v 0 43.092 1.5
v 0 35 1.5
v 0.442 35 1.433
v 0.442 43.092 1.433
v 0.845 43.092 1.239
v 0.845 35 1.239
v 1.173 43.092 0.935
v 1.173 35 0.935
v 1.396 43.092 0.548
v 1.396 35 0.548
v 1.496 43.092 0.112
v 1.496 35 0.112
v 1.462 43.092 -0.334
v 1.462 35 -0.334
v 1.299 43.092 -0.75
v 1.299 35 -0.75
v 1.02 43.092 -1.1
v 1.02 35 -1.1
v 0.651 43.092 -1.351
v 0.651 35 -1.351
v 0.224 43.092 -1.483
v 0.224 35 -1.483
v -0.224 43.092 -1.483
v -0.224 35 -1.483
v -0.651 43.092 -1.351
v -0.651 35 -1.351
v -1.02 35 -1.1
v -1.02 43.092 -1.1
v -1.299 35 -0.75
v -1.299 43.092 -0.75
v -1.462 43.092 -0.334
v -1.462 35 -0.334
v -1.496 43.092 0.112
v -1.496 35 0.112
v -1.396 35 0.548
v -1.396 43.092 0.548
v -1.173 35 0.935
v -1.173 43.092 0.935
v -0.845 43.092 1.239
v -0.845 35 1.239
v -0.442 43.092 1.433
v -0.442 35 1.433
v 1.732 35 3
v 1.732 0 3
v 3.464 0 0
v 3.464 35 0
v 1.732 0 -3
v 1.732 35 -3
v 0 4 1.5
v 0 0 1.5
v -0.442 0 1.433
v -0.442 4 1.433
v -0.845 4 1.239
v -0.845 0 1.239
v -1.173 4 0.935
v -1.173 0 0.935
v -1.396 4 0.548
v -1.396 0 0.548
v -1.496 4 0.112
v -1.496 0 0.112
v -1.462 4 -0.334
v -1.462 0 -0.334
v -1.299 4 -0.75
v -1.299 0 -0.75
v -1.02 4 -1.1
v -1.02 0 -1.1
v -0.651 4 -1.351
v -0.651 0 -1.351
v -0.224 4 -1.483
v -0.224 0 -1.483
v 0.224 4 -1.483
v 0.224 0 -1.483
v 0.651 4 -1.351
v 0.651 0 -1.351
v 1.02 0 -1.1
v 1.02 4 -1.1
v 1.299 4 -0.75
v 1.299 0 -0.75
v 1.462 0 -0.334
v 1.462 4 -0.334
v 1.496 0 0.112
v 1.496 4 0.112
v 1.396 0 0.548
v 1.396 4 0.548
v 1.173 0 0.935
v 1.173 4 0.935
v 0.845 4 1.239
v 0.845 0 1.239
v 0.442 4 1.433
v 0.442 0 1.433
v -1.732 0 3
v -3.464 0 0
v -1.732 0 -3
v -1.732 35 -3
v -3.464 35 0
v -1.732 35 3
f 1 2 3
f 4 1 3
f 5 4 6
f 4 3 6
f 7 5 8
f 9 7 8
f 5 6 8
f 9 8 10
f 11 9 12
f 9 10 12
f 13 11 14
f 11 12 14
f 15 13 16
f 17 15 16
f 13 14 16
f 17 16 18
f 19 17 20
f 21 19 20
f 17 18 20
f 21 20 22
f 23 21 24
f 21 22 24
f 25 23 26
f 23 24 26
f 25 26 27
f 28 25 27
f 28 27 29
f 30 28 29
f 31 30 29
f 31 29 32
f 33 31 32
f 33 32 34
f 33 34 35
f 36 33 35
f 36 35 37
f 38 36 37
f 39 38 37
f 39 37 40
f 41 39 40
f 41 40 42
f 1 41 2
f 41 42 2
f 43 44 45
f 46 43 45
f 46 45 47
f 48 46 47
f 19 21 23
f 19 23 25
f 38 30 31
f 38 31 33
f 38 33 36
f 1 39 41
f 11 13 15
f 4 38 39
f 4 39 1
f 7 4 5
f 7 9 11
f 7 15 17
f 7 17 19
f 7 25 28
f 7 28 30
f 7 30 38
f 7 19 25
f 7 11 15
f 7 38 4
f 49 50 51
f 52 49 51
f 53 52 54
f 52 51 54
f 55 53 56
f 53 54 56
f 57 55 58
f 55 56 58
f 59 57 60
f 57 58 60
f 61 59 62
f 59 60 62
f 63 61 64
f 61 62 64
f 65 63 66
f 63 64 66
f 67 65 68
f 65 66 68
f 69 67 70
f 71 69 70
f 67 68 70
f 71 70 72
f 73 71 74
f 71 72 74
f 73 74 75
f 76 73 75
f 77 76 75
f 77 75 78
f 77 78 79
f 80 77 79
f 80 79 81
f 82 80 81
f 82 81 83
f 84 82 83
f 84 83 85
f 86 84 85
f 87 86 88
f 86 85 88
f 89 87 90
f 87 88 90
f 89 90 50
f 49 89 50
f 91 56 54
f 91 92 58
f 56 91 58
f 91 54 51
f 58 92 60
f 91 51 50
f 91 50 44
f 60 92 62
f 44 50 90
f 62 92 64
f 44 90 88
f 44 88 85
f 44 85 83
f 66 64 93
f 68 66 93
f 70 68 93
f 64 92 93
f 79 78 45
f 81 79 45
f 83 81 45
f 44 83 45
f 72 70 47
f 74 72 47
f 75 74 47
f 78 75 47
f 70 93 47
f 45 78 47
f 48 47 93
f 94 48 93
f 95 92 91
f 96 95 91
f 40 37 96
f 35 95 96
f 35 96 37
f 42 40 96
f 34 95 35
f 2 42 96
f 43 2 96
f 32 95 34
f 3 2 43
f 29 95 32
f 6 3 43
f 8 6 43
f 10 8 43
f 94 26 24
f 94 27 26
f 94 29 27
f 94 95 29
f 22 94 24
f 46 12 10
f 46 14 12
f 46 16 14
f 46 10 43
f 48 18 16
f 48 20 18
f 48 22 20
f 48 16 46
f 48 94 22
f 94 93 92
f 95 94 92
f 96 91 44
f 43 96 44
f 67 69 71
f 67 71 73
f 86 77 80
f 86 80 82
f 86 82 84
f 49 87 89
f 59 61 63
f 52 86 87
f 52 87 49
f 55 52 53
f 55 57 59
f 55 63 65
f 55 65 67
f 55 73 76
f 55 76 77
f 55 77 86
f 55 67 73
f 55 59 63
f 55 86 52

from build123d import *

# Parameters (mm, degrees)
BOSS_EXTRUDE1_DEPTH = 35
SKETCH5_R           = 1.5
BOSS_EXTRUDE2_DEPTH = 8.091605471
SKETCH6_R           = 1.5
CUT_EXTRUDE1_DEPTH  = 4


with BuildPart() as part:
    # Sketch3 → Boss-Extrude1 (new body)
    with BuildSketch(Plane(origin=(0, 0, 0), x_dir=(1, 0, 0), z_dir=(0, 1, 0))):
        Polygon((-3.464101615, 0), (-1.732050808, -3), (1.732050808, -3), (3.464101615, 0), (1.732050808, 3), (-1.732050808, 3), align=None)
    extrude(amount=BOSS_EXTRUDE1_DEPTH)

    # Sketch5 → Boss-Extrude2 (add)
    with BuildSketch(Plane(origin=(0, 35, 0), x_dir=(1, 0, 0), z_dir=(0, 1, 0))):
        with Locations(Location((0, 0, 0), (0, 0, 270))):
            Circle(SKETCH5_R)
    extrude(amount=BOSS_EXTRUDE2_DEPTH)

    # Sketch6 → Cut-Extrude1 (cut)
    with BuildSketch(Plane.XZ):
        with Locations(Location((0, 0, 0), (0, 0, 90))):
            Circle(SKETCH6_R)
    extrude(amount=-CUT_EXTRUDE1_DEPTH, mode=Mode.SUBTRACT)


solid = part.part
